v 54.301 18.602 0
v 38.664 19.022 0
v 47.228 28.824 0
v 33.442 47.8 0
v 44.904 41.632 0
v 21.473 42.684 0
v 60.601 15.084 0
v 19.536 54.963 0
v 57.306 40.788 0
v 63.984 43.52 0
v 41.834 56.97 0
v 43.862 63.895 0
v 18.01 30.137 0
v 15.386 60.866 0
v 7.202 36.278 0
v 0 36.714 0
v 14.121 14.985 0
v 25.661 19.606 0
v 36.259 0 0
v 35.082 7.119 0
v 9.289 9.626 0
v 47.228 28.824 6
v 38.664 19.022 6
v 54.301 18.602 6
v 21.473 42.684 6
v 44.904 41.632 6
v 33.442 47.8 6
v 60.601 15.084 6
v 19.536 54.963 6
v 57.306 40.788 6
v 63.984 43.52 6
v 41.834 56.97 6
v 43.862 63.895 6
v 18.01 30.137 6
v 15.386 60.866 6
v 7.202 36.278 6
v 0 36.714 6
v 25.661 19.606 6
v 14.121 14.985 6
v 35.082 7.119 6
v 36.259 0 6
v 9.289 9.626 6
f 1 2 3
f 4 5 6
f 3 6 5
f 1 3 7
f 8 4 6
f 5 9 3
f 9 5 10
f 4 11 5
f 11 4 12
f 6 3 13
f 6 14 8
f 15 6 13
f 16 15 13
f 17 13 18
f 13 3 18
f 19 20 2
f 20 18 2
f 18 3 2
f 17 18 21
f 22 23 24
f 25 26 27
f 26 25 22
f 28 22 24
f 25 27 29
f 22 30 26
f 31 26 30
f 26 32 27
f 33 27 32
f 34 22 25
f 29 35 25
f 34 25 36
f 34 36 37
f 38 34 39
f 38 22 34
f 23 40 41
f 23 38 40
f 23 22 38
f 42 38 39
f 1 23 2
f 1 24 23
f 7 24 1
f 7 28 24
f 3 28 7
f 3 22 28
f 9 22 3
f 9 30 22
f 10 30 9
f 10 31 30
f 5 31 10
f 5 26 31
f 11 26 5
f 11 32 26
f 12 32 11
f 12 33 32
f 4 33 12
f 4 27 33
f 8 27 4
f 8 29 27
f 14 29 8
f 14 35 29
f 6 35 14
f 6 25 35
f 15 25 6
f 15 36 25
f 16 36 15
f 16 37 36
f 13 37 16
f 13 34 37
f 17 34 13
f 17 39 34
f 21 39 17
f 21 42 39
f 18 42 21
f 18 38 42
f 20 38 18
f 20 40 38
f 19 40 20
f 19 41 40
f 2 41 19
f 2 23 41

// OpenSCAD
$fn = 32;

// ----------------------------------------------------------------------
// Fan rotor section: 7 blades, 15 mm hub radius, 18 mm blades
// ----------------------------------------------------------------------

// --- parameters (mm) ---
profile_height = 6;       // extrusion height
profile_points = 21;      // points of the closed outline

profile = [[47.228, 28.824], [57.306, 40.788], [63.984, 43.52], [44.904, 41.632], [41.834, 56.97], [43.862, 63.895], [33.442, 47.8], [19.536, 54.963], [15.386, 60.866], [21.473, 42.684], [7.202, 36.278], [0, 36.714], [18.01, 30.137], [14.121, 14.985], [9.289, 9.626], [25.661, 19.606], [35.082, 7.119], [36.259, 0], [38.664, 19.022], [54.301, 18.602], [60.601, 15.084]];  // single closed polygon, 21 points, counter clockwise

// --- the one profile operation ---
linear_extrude(height = profile_height) polygon(points = profile);
